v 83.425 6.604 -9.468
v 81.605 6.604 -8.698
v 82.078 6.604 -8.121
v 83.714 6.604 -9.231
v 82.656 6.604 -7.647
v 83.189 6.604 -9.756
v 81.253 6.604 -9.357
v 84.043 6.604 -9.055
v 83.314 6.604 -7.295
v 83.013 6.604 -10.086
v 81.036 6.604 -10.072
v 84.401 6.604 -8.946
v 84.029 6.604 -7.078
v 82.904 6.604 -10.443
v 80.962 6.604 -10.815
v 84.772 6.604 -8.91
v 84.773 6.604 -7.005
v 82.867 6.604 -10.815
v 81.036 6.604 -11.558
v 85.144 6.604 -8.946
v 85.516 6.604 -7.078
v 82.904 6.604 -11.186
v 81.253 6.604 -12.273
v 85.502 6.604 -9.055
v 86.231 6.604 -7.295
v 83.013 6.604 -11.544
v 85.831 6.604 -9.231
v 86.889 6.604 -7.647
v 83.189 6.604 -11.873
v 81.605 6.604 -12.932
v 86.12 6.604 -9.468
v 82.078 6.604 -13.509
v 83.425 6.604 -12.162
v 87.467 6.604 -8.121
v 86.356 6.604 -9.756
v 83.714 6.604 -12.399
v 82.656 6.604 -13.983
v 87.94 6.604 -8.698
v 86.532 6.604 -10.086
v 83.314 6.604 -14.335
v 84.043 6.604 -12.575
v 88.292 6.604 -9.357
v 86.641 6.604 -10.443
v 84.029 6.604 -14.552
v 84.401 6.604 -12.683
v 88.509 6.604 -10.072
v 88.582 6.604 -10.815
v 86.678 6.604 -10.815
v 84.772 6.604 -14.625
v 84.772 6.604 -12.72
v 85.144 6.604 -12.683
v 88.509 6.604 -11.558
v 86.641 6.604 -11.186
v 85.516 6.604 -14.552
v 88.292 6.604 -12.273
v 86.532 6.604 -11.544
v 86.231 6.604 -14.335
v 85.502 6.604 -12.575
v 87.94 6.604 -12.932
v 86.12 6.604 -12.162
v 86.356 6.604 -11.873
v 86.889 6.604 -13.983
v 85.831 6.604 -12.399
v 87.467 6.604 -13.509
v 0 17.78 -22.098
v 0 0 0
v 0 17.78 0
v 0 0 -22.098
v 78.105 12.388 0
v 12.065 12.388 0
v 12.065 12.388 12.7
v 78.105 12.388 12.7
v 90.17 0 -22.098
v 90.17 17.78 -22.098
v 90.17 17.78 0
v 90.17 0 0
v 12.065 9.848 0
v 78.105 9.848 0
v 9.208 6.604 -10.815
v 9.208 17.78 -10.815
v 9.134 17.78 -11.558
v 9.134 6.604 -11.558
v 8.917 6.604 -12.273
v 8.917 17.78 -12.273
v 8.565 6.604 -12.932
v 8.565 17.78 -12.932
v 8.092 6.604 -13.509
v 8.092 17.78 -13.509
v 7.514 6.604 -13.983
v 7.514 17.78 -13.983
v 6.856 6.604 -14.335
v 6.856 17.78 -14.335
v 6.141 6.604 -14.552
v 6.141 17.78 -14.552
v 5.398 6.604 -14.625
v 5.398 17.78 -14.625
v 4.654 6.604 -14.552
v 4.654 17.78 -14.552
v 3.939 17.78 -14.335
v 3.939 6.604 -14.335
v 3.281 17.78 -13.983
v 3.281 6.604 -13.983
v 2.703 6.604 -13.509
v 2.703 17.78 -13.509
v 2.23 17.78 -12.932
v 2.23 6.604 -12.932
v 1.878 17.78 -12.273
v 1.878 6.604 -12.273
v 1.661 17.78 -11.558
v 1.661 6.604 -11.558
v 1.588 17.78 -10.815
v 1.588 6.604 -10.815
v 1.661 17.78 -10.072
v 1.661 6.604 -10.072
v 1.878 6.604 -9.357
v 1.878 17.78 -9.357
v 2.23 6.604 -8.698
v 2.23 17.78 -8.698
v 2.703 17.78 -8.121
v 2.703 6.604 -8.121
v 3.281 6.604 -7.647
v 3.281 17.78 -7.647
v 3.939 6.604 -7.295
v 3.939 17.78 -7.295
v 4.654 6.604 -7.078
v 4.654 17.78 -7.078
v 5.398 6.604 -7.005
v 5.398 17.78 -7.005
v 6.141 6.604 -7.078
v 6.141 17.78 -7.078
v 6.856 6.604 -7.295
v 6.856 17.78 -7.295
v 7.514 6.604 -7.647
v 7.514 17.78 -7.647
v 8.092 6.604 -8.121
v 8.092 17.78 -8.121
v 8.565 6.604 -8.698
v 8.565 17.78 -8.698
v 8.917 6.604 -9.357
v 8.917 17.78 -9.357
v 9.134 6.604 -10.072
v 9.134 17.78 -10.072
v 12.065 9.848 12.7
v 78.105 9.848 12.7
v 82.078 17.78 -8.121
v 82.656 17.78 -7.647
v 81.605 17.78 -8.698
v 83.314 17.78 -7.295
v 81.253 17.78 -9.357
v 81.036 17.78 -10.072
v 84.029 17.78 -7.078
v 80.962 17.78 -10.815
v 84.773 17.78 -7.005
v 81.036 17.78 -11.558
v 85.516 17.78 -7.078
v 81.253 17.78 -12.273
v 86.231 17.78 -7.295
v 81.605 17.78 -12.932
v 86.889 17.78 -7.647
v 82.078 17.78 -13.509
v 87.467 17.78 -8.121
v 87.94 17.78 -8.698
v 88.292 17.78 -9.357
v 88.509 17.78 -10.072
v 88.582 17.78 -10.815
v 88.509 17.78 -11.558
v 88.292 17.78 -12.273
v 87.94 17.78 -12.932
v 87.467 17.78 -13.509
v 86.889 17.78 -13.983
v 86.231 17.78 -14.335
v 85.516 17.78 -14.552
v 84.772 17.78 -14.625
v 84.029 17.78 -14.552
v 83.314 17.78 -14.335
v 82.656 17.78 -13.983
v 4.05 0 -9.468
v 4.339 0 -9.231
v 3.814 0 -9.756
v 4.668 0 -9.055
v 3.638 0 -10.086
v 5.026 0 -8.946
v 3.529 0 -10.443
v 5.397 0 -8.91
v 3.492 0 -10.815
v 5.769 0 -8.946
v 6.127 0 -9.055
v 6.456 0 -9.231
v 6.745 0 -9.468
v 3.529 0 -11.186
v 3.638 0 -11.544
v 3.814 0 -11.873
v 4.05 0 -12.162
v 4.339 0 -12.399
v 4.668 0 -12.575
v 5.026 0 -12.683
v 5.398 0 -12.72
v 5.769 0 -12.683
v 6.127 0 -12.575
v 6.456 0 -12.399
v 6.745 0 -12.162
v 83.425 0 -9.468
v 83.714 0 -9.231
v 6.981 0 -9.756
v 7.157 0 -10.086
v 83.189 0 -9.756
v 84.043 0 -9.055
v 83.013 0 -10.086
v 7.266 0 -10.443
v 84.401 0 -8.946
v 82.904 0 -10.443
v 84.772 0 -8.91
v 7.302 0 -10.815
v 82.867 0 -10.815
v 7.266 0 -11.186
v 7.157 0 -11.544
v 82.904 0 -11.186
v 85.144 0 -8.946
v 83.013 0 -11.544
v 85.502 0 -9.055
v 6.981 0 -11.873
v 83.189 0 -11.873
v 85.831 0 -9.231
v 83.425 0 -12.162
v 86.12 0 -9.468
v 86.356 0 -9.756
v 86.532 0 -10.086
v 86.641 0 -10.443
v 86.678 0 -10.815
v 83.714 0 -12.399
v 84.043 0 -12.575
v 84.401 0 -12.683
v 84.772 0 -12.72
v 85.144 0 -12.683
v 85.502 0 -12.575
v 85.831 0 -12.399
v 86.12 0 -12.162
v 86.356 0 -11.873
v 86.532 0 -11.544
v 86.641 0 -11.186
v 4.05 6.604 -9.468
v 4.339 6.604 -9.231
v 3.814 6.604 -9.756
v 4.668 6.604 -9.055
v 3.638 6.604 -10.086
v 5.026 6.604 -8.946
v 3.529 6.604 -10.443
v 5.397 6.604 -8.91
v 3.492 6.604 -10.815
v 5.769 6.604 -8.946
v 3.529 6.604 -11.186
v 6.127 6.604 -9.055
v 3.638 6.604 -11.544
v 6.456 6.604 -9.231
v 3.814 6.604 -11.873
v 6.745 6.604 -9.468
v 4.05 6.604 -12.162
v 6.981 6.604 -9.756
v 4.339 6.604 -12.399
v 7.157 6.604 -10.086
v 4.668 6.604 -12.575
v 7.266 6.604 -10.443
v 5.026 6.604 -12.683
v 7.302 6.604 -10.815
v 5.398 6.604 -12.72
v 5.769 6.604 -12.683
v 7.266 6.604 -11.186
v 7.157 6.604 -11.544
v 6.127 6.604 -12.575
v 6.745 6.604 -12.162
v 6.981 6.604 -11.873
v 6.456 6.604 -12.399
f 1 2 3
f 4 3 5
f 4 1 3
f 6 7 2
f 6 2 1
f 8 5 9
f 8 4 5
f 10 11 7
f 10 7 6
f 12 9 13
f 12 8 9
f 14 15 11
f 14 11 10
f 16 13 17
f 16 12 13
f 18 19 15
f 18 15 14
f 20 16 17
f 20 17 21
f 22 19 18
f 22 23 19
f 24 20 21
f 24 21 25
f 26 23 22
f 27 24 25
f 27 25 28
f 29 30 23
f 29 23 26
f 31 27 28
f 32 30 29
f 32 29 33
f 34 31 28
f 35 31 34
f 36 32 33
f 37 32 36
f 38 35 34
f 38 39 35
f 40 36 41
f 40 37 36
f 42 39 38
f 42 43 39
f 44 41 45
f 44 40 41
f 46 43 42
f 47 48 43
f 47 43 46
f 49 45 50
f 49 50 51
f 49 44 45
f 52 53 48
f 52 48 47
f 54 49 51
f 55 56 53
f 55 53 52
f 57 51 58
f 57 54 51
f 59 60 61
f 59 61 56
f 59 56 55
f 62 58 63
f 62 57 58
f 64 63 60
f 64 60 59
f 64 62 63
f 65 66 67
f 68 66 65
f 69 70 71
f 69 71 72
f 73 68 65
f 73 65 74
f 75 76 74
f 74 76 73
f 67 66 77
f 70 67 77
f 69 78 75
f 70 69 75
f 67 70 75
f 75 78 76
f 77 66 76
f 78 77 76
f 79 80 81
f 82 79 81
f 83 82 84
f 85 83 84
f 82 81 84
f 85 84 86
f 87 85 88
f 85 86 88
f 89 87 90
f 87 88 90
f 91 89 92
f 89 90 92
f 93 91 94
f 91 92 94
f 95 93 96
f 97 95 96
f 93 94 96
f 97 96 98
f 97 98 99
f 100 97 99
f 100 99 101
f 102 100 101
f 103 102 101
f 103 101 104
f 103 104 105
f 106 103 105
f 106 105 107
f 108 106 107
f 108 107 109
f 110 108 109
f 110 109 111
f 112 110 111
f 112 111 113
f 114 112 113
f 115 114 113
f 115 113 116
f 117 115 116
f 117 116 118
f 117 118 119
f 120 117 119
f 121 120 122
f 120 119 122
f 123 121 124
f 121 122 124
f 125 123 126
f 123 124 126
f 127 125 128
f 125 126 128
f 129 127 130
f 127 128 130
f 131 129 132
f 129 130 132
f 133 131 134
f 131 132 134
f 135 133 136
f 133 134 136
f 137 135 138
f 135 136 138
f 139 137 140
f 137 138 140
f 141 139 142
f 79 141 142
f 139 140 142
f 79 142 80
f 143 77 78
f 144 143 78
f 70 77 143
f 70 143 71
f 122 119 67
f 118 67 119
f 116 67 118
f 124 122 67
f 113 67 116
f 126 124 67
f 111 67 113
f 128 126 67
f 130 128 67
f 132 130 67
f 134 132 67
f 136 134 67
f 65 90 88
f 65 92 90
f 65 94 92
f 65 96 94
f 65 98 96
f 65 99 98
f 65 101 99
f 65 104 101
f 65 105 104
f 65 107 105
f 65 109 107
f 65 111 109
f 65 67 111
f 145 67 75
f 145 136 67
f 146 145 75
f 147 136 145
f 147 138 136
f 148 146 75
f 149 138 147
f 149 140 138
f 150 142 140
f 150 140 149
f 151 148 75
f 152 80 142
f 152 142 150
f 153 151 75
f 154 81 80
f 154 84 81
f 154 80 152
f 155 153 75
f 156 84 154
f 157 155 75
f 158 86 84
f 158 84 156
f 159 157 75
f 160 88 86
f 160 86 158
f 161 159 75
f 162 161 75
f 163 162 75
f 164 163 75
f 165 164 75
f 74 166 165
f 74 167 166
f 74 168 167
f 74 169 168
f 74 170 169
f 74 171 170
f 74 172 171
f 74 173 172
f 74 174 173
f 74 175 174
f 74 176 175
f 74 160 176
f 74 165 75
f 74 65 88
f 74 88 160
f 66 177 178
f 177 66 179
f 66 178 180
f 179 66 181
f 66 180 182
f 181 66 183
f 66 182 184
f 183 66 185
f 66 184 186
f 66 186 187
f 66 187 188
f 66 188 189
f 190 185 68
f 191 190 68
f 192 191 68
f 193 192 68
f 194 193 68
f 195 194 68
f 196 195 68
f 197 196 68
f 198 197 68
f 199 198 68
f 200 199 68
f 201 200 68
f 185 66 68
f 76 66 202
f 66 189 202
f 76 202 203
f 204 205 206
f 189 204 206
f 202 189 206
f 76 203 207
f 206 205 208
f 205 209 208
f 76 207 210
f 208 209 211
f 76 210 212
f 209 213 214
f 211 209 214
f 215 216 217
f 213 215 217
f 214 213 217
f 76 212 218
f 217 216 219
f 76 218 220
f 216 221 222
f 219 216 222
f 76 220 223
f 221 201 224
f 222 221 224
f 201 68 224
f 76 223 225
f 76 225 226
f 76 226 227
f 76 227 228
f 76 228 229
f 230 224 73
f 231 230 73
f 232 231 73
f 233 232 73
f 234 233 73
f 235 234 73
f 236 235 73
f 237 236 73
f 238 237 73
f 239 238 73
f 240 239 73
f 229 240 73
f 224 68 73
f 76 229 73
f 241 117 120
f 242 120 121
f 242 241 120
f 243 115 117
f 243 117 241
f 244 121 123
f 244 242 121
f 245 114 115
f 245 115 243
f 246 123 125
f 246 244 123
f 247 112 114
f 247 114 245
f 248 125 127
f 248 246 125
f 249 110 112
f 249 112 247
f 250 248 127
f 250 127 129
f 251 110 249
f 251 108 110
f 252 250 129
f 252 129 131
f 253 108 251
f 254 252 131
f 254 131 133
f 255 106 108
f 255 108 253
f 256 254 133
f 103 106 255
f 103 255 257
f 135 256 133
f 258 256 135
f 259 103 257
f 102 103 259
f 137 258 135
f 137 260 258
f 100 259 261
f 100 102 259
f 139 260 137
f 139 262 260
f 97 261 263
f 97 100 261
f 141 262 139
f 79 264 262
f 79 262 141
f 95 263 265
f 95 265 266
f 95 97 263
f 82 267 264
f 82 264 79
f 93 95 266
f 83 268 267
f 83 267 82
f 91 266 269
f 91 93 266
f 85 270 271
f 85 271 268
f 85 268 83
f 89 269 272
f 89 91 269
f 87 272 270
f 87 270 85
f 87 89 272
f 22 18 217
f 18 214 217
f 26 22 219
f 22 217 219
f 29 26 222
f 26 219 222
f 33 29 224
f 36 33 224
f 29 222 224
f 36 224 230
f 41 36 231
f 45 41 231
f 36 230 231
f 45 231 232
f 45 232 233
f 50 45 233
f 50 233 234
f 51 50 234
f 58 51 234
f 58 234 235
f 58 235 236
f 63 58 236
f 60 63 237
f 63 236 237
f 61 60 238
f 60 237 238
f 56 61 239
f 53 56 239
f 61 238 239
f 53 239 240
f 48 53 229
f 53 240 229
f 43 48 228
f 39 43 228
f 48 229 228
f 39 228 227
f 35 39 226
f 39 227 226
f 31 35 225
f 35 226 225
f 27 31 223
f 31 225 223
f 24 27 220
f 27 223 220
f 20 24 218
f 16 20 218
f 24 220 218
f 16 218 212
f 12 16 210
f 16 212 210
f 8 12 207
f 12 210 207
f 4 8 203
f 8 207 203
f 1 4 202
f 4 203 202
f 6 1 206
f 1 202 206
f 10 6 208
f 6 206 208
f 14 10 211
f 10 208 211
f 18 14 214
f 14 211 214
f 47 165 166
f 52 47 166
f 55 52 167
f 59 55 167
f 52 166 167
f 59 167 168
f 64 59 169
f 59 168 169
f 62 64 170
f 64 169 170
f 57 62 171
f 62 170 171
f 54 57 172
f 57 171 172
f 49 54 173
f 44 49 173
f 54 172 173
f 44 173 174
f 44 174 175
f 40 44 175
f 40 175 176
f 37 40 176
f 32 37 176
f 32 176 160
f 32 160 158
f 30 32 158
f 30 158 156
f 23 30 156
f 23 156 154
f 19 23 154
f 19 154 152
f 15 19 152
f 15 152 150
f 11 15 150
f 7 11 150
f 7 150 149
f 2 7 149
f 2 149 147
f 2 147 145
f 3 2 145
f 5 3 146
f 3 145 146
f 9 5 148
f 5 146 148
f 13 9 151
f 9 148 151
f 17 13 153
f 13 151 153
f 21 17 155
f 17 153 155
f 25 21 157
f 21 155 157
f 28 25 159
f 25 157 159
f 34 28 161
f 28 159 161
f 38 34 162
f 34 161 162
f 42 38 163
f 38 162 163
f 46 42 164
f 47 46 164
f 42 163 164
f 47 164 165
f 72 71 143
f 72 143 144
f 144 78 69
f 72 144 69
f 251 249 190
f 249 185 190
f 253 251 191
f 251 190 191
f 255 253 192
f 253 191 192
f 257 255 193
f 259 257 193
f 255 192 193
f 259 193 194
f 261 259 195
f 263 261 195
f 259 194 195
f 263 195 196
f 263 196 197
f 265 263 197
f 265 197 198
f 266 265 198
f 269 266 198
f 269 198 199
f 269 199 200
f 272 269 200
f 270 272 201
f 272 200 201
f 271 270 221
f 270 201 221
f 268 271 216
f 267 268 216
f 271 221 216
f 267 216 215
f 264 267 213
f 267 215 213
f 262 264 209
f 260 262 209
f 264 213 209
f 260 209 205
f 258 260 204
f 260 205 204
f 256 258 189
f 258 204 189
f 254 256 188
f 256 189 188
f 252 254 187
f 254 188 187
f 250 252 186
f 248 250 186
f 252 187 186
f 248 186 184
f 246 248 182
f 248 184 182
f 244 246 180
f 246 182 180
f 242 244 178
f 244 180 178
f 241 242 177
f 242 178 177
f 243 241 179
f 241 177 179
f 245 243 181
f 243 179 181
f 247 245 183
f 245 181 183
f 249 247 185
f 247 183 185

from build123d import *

# Parameters (mm, degrees)
SKETCH2_W                                           = 90.17
SKETCH2_H                                           = 22.098
BOSS_EXTRUDE1_DEPTH                                 = 17.78
SKETCH3_W                                           = 66.04
SKETCH3_H                                           = 2.54
BOSS_EXTRUDE2_DEPTH                                 = 12.7
CBORE_FOR_8_BINDING_HEAD_MACHINE_SCREW1_D           = 3.81
CBORE_FOR_8_BINDING_HEAD_MACHINE_SCREW1_CBORE_D     = 7.62
CBORE_FOR_8_BINDING_HEAD_MACHINE_SCREW1_CBORE_DEPTH = 11.176


with BuildPart() as part:
    # Sketch2 → Boss-Extrude1 (new body)
    with BuildSketch(Plane(origin=(0, 0, 0), x_dir=(1, 0, 0), z_dir=(0, 1, 0))):
        with Locations((45.085, 11.049)):
            Rectangle(SKETCH2_W, SKETCH2_H)
    extrude(amount=BOSS_EXTRUDE1_DEPTH)

    # Sketch3 → Boss-Extrude2 (add)
    with BuildSketch(Plane.XY):
        with Locations((45.085, 11.117631295)):
            Rectangle(SKETCH3_W, SKETCH3_H)
    extrude(amount=BOSS_EXTRUDE2_DEPTH)

    # CBORE for #8 Binding Head Machine Screw1 (through all)
    with Locations(Plane(origin=(0, 17.78, 0), x_dir=(1, 0, 0), z_dir=(0, 1, 0))):
        with Locations((5.3975, 10.814852879), (84.7725, 10.814852879)):
            CounterBoreHole(CBORE_FOR_8_BINDING_HEAD_MACHINE_SCREW1_D / 2, CBORE_FOR_8_BINDING_HEAD_MACHINE_SCREW1_CBORE_D / 2, CBORE_FOR_8_BINDING_HEAD_MACHINE_SCREW1_CBORE_DEPTH)


solid = part.part
